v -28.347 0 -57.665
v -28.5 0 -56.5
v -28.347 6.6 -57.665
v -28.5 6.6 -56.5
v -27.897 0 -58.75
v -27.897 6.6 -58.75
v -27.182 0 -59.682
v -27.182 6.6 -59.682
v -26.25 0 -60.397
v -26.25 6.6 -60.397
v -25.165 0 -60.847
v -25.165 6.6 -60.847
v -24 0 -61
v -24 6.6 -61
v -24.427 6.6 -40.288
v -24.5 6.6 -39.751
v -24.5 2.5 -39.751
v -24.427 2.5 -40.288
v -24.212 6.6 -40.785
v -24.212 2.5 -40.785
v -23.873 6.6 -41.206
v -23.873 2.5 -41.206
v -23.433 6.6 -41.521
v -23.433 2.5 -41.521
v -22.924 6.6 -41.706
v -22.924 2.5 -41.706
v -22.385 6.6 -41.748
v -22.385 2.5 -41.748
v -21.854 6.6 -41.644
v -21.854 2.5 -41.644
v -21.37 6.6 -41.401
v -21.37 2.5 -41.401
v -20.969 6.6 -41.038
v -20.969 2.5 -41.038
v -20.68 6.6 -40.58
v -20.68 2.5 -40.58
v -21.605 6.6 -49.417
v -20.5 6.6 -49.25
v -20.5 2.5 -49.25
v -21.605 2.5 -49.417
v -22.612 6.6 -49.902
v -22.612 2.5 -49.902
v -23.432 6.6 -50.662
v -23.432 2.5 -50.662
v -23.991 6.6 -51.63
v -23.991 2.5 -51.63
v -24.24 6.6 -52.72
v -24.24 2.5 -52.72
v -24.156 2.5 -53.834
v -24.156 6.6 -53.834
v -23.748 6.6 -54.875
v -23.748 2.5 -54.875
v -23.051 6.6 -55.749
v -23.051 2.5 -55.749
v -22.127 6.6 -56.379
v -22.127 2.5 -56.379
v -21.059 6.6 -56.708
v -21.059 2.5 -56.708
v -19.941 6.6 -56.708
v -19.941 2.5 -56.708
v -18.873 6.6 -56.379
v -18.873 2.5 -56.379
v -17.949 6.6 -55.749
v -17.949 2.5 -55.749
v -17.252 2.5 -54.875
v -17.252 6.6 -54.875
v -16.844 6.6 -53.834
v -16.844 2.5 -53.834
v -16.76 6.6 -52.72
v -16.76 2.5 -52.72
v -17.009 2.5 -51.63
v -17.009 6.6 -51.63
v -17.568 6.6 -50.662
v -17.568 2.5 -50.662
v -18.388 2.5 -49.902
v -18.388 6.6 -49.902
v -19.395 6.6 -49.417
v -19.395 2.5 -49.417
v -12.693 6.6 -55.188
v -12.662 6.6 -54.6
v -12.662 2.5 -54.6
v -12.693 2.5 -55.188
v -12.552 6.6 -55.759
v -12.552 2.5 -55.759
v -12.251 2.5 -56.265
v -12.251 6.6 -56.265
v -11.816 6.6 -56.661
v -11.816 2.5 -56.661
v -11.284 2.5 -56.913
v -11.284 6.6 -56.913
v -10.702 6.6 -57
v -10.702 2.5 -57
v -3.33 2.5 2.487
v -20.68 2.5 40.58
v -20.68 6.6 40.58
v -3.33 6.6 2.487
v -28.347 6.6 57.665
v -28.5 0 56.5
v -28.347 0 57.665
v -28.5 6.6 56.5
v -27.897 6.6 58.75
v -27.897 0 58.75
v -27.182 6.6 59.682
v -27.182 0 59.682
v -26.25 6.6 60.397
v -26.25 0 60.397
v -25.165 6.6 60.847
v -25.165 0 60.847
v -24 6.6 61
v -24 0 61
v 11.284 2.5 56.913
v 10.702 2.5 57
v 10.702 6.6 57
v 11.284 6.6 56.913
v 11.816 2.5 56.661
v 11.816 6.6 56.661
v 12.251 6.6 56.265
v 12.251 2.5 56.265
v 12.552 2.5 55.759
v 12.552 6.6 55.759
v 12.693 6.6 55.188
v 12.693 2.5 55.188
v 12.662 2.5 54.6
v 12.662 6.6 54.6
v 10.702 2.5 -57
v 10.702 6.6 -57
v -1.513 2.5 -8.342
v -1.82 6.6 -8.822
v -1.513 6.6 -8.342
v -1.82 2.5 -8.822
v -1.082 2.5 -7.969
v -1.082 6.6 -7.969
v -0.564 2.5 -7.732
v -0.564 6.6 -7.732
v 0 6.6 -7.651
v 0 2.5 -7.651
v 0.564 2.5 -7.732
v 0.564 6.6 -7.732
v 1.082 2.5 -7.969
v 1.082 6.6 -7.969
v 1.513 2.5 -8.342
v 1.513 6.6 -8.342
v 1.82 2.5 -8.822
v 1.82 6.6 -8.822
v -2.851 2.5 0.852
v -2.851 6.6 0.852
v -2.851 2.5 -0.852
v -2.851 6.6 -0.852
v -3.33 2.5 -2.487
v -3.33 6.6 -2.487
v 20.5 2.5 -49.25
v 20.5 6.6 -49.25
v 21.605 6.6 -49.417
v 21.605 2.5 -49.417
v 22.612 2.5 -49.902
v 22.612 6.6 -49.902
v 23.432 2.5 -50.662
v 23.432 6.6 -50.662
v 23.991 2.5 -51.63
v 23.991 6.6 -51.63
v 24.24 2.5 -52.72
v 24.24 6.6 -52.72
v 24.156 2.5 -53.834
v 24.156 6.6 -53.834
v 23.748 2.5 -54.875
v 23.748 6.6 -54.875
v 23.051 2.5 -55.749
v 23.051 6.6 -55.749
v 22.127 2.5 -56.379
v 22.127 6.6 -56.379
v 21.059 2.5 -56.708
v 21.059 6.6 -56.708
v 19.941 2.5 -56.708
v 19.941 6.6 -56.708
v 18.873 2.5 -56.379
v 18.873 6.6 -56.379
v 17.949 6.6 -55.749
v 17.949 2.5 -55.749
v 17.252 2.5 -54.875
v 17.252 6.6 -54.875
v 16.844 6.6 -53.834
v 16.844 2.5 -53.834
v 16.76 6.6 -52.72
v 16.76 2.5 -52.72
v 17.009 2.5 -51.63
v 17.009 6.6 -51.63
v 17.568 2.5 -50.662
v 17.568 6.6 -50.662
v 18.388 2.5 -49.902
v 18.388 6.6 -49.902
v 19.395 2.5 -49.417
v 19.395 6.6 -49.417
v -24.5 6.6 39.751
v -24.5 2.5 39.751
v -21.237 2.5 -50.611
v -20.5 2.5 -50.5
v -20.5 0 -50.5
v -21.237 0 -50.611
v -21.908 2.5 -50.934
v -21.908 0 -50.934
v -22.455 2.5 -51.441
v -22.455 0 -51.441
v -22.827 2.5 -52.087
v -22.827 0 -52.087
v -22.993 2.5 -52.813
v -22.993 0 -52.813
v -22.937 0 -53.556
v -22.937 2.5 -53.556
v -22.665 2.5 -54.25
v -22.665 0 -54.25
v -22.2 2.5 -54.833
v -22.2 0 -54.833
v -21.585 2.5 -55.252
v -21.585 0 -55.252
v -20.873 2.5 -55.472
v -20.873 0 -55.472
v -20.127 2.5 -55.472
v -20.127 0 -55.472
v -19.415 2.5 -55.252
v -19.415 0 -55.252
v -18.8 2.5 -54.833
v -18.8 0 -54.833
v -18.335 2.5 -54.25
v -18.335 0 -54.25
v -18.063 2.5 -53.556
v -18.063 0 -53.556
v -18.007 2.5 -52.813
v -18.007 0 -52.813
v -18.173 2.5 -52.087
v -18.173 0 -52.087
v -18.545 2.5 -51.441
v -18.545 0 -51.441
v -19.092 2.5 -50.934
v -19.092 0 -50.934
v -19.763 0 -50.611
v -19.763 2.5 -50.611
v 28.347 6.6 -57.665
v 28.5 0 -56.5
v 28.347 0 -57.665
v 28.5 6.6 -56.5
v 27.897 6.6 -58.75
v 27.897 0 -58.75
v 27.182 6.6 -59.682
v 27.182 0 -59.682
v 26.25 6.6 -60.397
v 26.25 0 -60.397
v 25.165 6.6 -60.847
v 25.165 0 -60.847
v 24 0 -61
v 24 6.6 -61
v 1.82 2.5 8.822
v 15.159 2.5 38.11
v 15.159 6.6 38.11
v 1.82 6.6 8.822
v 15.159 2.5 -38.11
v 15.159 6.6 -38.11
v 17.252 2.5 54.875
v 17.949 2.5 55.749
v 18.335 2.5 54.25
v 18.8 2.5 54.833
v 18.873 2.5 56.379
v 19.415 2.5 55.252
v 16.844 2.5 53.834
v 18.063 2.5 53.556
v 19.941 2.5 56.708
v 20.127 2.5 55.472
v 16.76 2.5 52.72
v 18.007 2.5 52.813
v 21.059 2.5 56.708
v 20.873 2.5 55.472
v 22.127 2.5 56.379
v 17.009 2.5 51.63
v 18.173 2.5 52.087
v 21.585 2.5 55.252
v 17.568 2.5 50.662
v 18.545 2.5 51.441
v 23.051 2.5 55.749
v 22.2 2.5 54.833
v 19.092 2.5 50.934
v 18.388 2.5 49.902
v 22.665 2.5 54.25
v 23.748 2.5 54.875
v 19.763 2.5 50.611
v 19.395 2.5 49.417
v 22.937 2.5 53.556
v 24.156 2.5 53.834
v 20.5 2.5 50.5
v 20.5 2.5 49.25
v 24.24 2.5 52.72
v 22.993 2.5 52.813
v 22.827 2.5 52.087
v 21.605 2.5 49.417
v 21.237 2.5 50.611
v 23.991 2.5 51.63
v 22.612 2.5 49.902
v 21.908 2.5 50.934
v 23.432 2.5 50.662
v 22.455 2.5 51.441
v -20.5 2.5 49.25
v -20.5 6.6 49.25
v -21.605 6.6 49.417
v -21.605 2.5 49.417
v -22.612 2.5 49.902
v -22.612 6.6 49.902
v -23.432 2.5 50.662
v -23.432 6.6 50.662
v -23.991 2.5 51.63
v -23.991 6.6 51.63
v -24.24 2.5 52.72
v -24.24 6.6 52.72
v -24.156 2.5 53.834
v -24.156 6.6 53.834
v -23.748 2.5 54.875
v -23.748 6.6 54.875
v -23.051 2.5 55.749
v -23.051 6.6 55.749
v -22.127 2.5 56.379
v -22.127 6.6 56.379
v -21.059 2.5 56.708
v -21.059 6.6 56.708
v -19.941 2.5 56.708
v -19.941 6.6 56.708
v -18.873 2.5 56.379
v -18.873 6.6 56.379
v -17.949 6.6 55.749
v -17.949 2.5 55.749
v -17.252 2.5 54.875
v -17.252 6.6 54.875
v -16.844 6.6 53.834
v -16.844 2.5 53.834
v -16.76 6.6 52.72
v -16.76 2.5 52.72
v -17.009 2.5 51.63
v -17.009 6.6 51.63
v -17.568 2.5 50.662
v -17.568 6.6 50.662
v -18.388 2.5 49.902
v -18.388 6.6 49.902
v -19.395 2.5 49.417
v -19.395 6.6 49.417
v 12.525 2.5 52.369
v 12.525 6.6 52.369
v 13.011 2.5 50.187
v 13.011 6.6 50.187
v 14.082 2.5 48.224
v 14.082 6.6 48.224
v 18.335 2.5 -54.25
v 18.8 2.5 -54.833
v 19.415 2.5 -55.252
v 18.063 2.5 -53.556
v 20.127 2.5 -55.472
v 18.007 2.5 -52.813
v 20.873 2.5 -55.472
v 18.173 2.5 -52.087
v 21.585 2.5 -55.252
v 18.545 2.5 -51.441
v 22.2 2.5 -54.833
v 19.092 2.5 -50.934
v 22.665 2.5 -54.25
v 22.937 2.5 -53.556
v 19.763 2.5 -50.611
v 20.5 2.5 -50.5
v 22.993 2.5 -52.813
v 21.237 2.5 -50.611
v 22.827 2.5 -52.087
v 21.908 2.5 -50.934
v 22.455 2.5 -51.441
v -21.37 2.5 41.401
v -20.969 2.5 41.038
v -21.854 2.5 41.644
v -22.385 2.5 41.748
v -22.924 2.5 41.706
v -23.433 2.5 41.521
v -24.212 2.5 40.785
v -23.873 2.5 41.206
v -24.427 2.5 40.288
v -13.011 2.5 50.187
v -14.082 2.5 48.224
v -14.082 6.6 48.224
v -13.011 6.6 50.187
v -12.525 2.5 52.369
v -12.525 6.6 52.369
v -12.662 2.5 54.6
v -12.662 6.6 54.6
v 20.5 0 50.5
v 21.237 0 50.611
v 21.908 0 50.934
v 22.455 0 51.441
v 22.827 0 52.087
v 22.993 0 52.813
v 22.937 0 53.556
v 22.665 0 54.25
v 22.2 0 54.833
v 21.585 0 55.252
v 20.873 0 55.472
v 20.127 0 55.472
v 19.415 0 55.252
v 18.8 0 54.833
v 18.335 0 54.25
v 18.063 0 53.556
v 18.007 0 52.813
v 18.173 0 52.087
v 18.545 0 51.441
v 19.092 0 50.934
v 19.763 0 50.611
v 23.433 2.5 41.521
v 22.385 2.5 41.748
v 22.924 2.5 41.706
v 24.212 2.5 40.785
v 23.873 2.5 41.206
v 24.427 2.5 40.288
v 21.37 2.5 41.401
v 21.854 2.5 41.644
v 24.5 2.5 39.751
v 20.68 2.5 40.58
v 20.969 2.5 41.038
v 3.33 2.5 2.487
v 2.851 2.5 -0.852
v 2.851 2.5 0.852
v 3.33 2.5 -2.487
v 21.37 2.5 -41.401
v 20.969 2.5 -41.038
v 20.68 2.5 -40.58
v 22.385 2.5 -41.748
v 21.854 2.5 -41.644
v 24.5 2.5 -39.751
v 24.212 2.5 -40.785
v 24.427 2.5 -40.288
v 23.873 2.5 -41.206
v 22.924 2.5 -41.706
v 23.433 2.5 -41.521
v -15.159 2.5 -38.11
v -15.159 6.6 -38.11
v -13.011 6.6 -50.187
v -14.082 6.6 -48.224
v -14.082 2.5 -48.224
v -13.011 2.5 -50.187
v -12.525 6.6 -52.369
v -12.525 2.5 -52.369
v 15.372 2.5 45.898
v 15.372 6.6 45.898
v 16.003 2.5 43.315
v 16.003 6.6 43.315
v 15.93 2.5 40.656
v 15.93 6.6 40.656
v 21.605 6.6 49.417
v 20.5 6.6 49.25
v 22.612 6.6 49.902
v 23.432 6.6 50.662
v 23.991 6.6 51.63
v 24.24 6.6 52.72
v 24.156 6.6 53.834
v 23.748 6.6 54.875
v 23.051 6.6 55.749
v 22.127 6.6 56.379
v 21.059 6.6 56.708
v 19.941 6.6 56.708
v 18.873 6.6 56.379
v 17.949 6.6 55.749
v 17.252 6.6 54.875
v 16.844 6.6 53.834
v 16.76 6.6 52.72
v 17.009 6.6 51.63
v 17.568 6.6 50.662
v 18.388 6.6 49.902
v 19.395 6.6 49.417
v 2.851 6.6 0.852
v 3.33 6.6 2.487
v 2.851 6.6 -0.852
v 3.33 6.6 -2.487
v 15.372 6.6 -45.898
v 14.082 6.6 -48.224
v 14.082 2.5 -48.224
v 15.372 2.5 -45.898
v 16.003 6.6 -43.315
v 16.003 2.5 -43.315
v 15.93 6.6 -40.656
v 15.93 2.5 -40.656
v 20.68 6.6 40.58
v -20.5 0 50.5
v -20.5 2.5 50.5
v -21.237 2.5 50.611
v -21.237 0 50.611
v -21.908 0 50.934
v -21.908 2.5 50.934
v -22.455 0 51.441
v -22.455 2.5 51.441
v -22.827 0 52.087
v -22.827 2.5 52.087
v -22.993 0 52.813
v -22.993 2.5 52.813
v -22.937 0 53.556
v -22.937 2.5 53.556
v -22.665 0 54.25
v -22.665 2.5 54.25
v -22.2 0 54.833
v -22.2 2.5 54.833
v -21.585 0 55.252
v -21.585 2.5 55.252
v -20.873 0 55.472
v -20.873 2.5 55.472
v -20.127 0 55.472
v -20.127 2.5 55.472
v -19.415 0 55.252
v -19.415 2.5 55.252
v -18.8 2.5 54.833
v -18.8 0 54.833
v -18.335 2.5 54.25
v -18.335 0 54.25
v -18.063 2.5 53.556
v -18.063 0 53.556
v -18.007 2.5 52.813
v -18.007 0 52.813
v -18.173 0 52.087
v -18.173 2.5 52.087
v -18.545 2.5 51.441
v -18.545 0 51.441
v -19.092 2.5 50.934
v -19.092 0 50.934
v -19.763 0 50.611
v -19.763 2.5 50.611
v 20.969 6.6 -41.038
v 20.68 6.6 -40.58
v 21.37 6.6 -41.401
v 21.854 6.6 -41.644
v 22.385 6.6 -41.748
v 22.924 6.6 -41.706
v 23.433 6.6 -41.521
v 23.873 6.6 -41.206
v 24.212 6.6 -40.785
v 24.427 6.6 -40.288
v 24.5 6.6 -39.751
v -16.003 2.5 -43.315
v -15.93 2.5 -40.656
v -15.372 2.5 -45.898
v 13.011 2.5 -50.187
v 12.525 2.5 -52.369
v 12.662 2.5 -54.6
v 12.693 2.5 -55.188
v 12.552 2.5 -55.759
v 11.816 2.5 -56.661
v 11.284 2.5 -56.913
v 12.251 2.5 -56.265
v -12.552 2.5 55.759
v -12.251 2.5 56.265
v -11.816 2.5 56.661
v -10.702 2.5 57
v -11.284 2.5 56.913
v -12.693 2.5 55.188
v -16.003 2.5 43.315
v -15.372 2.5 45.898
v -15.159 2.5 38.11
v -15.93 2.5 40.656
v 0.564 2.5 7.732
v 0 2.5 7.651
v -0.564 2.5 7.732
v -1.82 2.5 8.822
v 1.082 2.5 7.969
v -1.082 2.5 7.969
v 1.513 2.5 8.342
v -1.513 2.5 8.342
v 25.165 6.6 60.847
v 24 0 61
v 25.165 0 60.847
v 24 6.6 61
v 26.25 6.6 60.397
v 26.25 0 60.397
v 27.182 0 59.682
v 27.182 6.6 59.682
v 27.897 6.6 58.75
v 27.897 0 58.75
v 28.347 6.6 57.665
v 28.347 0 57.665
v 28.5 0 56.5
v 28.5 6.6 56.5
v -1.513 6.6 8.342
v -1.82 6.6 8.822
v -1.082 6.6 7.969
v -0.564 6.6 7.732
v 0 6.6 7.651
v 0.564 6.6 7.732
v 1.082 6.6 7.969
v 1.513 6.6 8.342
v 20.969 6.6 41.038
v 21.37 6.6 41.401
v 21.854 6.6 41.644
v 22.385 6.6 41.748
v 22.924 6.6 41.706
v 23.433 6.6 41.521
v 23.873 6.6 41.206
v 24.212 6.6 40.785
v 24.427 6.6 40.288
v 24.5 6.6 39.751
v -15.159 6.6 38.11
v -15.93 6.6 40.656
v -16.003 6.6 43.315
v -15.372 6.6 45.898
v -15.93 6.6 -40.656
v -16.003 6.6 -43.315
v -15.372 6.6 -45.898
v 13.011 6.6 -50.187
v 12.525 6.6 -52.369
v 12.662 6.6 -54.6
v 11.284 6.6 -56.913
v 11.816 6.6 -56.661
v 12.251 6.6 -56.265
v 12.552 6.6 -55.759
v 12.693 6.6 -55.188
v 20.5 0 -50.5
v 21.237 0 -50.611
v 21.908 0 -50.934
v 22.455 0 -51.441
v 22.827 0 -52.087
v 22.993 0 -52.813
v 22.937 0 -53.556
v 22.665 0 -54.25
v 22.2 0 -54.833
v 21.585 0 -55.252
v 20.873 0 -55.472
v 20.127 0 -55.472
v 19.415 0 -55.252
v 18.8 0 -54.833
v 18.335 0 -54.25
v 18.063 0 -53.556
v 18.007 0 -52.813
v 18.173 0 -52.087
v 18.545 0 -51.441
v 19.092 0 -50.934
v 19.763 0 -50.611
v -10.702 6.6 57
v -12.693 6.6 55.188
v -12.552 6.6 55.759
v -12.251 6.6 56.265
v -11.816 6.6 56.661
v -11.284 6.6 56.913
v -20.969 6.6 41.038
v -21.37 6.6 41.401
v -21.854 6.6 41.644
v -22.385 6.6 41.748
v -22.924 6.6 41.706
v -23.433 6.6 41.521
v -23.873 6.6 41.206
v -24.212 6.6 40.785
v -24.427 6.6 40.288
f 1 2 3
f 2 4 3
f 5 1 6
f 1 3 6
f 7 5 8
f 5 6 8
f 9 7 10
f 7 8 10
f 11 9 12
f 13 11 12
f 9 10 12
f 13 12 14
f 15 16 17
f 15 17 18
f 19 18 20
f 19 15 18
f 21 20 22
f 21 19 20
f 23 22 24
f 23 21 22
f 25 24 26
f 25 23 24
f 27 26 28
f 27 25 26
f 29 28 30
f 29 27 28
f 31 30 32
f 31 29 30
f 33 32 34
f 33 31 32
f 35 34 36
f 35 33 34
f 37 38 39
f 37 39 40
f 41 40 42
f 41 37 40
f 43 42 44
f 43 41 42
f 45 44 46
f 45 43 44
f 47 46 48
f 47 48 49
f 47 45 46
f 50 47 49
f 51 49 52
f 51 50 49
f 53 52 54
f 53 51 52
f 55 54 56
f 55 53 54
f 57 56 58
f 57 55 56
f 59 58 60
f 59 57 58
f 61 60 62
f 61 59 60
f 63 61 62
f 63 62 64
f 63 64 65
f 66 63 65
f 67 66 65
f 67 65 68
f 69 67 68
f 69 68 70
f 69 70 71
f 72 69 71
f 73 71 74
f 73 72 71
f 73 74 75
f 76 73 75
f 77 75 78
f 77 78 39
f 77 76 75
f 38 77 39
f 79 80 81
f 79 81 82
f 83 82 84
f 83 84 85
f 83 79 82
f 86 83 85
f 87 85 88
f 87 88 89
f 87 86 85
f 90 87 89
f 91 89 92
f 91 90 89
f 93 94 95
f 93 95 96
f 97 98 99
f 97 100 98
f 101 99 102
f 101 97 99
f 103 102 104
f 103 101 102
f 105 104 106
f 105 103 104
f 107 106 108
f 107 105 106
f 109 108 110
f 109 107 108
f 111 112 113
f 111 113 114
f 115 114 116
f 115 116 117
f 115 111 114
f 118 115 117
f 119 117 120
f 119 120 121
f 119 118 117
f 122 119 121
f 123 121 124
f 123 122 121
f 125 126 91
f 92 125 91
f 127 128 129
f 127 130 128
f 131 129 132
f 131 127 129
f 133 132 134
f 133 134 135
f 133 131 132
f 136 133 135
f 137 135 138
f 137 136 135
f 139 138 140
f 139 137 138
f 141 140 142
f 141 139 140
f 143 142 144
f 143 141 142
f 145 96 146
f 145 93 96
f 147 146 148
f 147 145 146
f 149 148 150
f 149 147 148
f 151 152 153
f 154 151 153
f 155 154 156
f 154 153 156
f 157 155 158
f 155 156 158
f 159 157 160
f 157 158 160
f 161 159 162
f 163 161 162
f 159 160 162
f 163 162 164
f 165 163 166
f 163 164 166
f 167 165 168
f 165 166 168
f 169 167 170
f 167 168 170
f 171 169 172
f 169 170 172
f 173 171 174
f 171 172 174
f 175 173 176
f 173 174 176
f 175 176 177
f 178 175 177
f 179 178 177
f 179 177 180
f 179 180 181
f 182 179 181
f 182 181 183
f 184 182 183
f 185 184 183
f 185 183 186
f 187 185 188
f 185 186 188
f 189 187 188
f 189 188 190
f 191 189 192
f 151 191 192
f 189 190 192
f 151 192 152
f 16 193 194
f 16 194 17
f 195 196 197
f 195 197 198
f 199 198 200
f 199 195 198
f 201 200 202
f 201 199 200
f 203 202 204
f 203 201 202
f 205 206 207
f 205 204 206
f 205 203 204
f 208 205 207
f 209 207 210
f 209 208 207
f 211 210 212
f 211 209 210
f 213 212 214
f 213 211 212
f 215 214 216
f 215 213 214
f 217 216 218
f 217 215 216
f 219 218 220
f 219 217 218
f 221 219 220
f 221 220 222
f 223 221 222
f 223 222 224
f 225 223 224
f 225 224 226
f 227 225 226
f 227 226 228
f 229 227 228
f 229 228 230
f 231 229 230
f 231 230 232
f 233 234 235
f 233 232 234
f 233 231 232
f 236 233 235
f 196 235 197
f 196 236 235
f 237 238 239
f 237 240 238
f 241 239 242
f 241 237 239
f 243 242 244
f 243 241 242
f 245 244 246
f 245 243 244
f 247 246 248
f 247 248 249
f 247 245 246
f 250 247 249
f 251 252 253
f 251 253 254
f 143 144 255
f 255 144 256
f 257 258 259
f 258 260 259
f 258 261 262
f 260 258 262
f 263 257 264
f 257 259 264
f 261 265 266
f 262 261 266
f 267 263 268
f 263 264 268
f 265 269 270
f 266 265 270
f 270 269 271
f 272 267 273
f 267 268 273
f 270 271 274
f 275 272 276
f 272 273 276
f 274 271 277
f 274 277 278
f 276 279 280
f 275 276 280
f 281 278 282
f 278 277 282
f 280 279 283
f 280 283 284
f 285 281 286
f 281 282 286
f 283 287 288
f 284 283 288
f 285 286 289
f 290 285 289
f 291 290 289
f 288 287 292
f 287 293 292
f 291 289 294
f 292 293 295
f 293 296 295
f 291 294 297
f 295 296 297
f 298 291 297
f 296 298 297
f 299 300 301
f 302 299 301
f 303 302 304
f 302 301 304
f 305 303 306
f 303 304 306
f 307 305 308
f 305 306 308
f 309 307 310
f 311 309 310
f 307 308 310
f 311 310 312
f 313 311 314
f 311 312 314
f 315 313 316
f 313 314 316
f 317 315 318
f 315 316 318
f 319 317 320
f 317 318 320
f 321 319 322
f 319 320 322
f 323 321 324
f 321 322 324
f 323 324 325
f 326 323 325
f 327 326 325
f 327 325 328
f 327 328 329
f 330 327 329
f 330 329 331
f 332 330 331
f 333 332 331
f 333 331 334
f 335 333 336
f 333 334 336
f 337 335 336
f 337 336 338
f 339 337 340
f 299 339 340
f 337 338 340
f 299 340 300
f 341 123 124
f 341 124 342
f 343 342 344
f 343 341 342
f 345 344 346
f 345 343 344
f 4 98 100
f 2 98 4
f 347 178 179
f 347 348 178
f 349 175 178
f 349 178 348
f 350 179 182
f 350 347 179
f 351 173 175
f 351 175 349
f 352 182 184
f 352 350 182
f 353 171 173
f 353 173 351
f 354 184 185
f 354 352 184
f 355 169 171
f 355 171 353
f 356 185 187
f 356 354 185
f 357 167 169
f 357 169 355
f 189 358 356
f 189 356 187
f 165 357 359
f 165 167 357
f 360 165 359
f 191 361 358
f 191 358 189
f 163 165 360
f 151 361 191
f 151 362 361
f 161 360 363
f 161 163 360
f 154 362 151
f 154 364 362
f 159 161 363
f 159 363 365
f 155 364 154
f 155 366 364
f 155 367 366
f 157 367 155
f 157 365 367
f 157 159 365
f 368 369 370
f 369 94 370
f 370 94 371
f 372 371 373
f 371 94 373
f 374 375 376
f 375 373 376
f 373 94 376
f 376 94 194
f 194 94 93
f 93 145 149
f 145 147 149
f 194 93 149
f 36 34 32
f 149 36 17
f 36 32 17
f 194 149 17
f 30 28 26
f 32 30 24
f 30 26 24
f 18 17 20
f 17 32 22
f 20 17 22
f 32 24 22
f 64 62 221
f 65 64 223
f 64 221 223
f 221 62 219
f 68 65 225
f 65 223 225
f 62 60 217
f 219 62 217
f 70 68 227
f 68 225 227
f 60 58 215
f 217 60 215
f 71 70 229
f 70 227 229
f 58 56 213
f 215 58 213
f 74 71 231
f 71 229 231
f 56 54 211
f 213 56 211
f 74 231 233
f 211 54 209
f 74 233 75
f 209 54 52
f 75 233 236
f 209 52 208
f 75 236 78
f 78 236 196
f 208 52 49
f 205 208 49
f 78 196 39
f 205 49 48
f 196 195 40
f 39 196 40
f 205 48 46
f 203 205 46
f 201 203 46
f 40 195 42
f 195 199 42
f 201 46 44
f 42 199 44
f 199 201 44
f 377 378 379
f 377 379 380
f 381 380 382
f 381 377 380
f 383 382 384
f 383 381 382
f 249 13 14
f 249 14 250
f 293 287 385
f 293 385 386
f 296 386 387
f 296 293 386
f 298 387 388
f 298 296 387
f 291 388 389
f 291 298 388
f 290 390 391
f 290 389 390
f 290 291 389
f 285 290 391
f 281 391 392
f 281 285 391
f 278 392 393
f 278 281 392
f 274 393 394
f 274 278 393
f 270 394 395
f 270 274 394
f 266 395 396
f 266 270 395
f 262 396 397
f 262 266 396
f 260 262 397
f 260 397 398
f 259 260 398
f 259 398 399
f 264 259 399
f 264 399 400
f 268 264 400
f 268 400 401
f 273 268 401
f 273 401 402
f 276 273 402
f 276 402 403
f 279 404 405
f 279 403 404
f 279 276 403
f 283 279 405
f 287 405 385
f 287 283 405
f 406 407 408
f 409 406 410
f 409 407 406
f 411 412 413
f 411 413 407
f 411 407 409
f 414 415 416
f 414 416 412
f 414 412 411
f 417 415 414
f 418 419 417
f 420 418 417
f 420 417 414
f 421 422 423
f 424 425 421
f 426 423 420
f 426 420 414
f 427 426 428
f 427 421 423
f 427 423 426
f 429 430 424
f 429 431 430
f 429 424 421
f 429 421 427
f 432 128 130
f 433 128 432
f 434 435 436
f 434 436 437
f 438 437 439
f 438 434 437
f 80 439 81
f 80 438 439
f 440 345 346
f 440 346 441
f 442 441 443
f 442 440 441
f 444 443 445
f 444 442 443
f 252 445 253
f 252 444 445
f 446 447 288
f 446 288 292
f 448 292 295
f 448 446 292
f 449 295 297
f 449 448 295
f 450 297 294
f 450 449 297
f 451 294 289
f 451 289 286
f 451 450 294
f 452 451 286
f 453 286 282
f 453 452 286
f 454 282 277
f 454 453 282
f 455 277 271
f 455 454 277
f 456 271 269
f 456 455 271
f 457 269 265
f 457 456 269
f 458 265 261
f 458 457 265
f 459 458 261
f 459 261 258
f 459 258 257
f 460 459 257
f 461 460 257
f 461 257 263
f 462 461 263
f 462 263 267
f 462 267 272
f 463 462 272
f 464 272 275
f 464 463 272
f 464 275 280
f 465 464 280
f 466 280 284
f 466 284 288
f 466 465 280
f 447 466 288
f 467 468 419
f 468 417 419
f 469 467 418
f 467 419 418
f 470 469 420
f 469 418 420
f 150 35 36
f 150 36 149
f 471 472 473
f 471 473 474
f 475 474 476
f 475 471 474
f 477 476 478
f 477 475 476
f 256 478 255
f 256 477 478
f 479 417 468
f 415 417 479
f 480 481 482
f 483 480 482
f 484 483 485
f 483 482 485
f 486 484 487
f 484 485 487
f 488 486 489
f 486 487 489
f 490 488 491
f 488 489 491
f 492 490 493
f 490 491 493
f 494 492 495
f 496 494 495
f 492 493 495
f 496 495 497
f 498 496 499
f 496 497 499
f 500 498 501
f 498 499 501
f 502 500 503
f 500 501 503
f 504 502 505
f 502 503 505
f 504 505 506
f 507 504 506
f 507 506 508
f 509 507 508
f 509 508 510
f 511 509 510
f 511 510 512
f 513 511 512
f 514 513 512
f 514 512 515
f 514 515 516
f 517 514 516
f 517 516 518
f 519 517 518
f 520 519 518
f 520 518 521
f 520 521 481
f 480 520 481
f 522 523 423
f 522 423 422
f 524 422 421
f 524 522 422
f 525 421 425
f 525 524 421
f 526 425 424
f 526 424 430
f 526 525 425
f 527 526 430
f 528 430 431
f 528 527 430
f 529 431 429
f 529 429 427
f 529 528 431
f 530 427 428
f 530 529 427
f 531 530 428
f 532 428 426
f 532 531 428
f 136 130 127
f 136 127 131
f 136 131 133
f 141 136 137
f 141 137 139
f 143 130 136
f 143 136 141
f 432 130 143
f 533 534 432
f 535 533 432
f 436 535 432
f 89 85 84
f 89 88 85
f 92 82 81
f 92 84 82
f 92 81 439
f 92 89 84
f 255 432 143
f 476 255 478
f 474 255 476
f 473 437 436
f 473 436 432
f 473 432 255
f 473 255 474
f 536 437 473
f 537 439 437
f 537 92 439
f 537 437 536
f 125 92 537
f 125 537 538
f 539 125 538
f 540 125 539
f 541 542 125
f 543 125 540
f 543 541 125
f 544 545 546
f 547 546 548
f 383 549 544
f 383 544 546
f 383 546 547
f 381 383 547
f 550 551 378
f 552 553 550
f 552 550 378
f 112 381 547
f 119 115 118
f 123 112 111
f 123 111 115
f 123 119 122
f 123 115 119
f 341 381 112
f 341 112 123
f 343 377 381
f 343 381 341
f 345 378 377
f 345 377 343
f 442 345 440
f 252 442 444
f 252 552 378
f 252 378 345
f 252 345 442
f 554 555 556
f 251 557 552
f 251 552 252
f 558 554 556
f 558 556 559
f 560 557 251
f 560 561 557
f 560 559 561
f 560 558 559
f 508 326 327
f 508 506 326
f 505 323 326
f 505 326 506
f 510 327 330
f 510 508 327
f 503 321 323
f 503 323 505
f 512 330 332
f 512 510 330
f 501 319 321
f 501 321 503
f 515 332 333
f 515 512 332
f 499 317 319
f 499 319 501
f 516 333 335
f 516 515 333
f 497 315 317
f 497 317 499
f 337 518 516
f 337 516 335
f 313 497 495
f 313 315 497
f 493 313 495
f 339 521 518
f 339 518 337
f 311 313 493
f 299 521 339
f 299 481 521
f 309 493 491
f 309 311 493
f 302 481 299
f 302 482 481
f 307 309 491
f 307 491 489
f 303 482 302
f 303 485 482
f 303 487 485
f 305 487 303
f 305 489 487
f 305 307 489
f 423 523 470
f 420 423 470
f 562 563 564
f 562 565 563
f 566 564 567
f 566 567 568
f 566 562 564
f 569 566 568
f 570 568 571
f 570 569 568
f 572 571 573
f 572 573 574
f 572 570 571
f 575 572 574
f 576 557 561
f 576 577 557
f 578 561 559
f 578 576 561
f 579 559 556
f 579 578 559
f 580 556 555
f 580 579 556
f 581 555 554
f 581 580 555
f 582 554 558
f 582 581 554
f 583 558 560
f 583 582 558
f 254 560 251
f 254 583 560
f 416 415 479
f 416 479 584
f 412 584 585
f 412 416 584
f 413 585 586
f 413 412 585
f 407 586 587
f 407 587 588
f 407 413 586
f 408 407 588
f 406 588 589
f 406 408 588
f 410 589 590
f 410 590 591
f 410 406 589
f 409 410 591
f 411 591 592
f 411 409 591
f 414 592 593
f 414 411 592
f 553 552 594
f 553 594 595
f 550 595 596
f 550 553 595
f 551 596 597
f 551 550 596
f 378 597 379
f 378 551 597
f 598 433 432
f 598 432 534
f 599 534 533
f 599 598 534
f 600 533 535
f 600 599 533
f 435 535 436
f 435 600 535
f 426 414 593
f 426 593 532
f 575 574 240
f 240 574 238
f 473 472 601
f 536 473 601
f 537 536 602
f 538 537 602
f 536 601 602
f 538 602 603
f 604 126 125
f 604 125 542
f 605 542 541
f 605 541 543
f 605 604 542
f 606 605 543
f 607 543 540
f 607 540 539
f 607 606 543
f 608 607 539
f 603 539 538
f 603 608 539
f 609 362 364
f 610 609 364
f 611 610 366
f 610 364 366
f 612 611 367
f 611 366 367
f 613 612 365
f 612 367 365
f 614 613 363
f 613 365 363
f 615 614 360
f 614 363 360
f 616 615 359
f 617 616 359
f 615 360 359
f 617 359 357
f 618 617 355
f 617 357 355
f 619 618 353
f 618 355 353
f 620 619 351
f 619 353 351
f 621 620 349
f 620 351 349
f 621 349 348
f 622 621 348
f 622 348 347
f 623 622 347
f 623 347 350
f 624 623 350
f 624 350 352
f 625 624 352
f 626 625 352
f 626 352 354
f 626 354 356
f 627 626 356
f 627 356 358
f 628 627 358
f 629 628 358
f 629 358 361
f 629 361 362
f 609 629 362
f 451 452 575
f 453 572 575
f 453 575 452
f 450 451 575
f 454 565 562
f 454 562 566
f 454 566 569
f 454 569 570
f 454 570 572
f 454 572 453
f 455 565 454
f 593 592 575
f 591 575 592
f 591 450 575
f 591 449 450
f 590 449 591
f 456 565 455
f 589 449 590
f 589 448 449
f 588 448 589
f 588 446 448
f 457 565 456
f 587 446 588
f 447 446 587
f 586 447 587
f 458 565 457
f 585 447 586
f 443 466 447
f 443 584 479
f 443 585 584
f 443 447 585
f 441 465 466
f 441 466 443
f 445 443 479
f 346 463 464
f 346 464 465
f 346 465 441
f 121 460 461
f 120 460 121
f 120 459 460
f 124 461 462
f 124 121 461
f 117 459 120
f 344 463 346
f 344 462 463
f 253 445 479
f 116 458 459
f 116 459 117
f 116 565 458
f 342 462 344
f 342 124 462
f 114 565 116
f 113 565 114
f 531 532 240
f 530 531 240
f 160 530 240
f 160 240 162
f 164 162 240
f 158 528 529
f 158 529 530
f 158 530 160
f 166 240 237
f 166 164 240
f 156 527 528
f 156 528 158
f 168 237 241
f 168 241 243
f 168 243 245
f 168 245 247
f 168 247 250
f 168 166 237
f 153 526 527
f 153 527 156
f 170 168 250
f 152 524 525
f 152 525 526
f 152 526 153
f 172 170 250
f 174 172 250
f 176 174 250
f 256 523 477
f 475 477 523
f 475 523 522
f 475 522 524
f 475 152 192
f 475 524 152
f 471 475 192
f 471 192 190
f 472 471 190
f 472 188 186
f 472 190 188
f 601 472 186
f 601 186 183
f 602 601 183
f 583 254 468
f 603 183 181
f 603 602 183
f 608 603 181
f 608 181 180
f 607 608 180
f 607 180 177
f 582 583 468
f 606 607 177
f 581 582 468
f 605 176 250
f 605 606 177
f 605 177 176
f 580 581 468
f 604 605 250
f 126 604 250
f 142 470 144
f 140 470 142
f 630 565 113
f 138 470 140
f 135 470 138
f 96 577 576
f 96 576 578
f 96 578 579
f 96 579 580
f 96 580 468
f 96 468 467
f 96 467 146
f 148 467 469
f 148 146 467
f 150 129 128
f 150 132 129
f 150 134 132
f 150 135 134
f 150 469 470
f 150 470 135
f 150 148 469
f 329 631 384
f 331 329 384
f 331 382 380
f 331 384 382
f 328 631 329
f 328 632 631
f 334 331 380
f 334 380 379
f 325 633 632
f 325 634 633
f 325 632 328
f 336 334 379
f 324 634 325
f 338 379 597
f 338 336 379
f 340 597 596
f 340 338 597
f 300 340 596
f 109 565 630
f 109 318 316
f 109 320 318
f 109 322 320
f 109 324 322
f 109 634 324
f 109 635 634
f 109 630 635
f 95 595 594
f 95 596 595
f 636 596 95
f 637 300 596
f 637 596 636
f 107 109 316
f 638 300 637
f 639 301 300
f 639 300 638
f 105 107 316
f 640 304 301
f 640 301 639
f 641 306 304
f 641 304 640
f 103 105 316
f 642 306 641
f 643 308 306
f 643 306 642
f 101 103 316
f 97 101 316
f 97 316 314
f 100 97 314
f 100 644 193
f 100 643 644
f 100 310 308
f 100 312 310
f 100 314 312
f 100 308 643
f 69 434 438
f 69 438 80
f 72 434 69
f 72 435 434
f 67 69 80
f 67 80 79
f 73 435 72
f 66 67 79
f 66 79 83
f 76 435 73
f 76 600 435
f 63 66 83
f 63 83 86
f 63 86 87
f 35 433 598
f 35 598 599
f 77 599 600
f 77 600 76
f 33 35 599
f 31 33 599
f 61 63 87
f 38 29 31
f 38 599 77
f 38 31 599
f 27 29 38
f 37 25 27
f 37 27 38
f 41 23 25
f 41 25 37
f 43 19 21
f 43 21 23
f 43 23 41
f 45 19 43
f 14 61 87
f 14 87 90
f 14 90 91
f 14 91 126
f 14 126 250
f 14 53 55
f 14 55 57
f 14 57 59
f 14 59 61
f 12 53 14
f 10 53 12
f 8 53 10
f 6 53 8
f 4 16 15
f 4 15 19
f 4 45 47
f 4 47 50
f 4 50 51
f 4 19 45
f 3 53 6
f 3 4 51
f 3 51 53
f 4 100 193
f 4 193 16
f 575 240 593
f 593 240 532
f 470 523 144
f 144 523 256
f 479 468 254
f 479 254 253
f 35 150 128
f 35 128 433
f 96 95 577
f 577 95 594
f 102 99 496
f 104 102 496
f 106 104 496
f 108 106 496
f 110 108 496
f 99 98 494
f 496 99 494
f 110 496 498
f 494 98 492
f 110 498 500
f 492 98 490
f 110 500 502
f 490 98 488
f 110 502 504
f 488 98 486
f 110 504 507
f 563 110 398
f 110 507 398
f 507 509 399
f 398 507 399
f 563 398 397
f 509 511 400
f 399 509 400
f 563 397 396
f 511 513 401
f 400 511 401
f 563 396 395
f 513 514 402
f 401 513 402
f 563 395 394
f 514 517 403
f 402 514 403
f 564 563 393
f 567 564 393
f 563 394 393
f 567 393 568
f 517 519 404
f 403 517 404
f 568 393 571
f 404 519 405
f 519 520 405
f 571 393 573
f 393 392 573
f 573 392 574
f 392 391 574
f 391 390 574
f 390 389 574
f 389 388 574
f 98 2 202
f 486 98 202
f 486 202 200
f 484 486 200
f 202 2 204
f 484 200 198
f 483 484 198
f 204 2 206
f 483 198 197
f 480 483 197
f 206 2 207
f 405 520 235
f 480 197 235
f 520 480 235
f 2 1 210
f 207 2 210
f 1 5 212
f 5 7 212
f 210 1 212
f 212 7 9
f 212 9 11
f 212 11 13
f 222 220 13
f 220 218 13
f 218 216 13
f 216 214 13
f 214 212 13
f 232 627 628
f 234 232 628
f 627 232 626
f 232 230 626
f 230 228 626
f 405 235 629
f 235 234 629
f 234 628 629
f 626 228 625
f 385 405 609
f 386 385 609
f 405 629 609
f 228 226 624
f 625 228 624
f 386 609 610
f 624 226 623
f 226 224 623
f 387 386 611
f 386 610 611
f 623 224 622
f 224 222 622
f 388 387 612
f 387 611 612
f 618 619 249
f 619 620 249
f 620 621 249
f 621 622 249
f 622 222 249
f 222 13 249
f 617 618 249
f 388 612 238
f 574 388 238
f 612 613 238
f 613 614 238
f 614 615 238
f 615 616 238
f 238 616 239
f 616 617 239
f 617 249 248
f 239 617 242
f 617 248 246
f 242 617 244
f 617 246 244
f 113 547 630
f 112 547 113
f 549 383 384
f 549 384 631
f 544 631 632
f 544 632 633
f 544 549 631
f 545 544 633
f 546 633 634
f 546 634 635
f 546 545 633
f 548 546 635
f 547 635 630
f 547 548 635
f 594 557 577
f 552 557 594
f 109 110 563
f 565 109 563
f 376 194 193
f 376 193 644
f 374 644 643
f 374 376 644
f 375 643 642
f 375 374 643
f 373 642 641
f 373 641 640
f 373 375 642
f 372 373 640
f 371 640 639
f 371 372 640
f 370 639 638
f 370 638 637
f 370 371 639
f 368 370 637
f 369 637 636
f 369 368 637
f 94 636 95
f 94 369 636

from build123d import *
from OCP.BRepFilletAPI import BRepFilletAPI_MakeFillet

# Parameters (mm, degrees)
SKETCH1_W               = 57
SKETCH1_H               = 122
BOSS_EXTRUDE1_DEPTH     = 6.6
FILLET1_R               = 4.5
SKETCH2_R               = 2.5
CUT_EXTRUDE1_DEPTH      = 68.652124874
SKETCH3_R               = 3.75
CUT_EXTRUDE2_DEPTH      = 4.1
MIRROR3_COPY_1_SKETCH_R = 2.5
MIRROR3_COPY_1_DEPTH    = 68.652124874
MIRROR3_COPY_2_SKETCH_R = 3.75
MIRROR3_COPY_2_DEPTH    = 4.1
CUT_EXTRUDE3_DEPTH      = 4.1
FILLET2_R               = 10
FILLET3_R               = 2
FILLET2_OF_MIRROR4_R    = 10
FILLET3_OF_MIRROR4_R    = 2
MIRROR5_START           = 2.5
MIRROR5_DEPTH           = 4.1
FILLET4_R1              = 2
FILLET4_R2              = 6


with BuildPart() as part:
    # Sketch1 → Boss-Extrude1 (new body)
    with BuildSketch(Plane(origin=(0, 0, 0), x_dir=(1, 0, 0), z_dir=(0, 1, 0))):
        Rectangle(SKETCH1_W, SKETCH1_H)
    extrude(amount=BOSS_EXTRUDE1_DEPTH)

    # Fillet1
    fillet1_edges = [part.edges().sort_by_distance(p)[0] for p in [
        (28.5, 3.3, 61),
        (-28.5, 3.3, 61),
        (-28.5, 3.3, -61),
        (28.5, 3.3, -61),
    ]]
    fillet(fillet1_edges, radius=FILLET1_R)

    # Sketch2 → Cut-Extrude1 (cut, through all)
    with BuildSketch(Plane(origin=(0, 6.6, 0), x_dir=(1, 0, 0), z_dir=(0, 1, 0))):
        with Locations(Location((20.5, 53, 0), (0, 0, 270))):
            Circle(SKETCH2_R)
    cut_extrude1 = extrude(amount=-CUT_EXTRUDE1_DEPTH, mode=Mode.SUBTRACT)

    # Sketch3 → Cut-Extrude2 (cut)
    with BuildSketch(Plane(origin=(0, 6.6, 0), x_dir=(1, 0, 0), z_dir=(0, 1, 0))):
        with Locations(Location((20.5, 53, 0), (0, 0, 270))):
            Circle(SKETCH3_R)
    cut_extrude2 = extrude(amount=-CUT_EXTRUDE2_DEPTH, mode=Mode.SUBTRACT)

    # Mirror1: Cut-Extrude1, Cut-Extrude2 across plane
    add(cut_extrude1.mirror(Plane(origin=(0, 0, 0), x_dir=(0, 0, 1), z_dir=(1, 0, 0))), mode=Mode.SUBTRACT)
    add(cut_extrude2.mirror(Plane(origin=(0, 0, 0), x_dir=(0, 0, 1), z_dir=(1, 0, 0))), mode=Mode.SUBTRACT)

    # Mirror3: Cut-Extrude1, Cut-Extrude2 across plane
    add(cut_extrude1.mirror(Plane.XY), mode=Mode.SUBTRACT)
    add(cut_extrude2.mirror(Plane.XY), mode=Mode.SUBTRACT)

    # Mirror3 copy 1 sketch → Mirror3 copy 1 (cut, through all)
    with BuildSketch(Plane(origin=(0, 6.6, 0), x_dir=(-1, 0, 0), z_dir=(0, 1, 0))):
        with Locations(Location((20.5, 53, 0), (0, 0, 270))):
            Circle(MIRROR3_COPY_1_SKETCH_R)
    extrude(amount=-MIRROR3_COPY_1_DEPTH, mode=Mode.SUBTRACT)

    # Mirror3 copy 2 sketch → Mirror3 copy 2 (cut)
    with BuildSketch(Plane(origin=(0, 6.6, 0), x_dir=(-1, 0, 0), z_dir=(0, 1, 0))):
        with Locations(Location((20.5, 53, 0), (0, 0, 270))):
            Circle(MIRROR3_COPY_2_SKETCH_R)
    extrude(amount=-MIRROR3_COPY_2_DEPTH, mode=Mode.SUBTRACT)

    # Sketch4 → Cut-Extrude3 (cut)
    with BuildSketch(Plane(origin=(0, 6.6, 0), x_dir=(1, 0, 0), z_dir=(0, 1, 0))):
        with BuildLine():
            Line((0, 57), (0, 4.825290504))
            Line((0, 4.825290504), (18.422458297, 45.274469567))
            ThreePointArc((18.422458297, 45.274469567), (13.107579799, 49.941875809), (13.57179677, 57))
            Line((13.57179677, 57), (0, 57))
        make_face()
        with BuildLine():
            Line((24.5, 0), (24.5, 46.07179677))
            ThreePointArc((24.5, 46.07179677), (23.697246566, 45.666677806), (22.854101194, 45.354203274))
            Line((22.854101194, 45.354203274), (2.197664208, 0))
            Line((2.197664208, 0), (24.5, 0))
        make_face()
    cut_extrude3 = extrude(amount=-CUT_EXTRUDE3_DEPTH, mode=Mode.SUBTRACT)

    # Fillet2
    # the kernel refuses this fillet: 10 mm, written as the material it adds along each edge
    with BuildSketch(Plane(origin=(22.854101194, 6.6, -45.354203274), x_dir=(0.9166652742214988, 0, -0.3996558207213108), z_dir=(0, -1, 0))) as fillet2_piece_1:
        with BuildLine():
            CenterArc((4.145887895, 9.719866853), FILLET2_R, 228.043415152, 28.362844717)
            Line((-2.539785162, 2.28335048), (-2.673498623, 2.134620152))
            Line((-2.673498623, 2.134620152), (-0.133713461, -0.148730327))
            Line((-0.133713461, -0.148730327), (0.022444109, -0.198736665))
            ThreePointArc((0.022444109, -0.198736665), (0.897764349, -0.149466597), (1.748521514, -0.194397337))
            Line((1.748521514, -0.194397337), (1.795528698, 0))
        make_face()
    extrude(amount=4.1)
    with BuildSketch(Plane(origin=(18.422458297, 6.6, -45.274469567), x_dir=(-0.41448281678671633, 0, 0.9100571380899934), z_dir=(0, -1, 0))) as fillet2_piece_2:
        with BuildLine():
            CenterArc((7.872374254, 10), FILLET2_R, 208.861826981, 61.138173019)
            Line((-0.885488916, 5.173009977), (-1.06064618, 5.076470177))
            ThreePointArc((-1.06064618, 5.076470177), (-0.203601176, 2.627440291), (-0.197294486, 0.032785449))
            Line((-0.197294486, 0.032785449), (0, -0.2))
            Line((0, -0.2), (7.872374254, -0.2))
            Line((7.872374254, -0.2), (7.872374254, 0))
        make_face()
    extrude(amount=4.1)

    # Fillet3
    # the kernel refuses this fillet: 2 mm, written as the material it adds along each edge
    with BuildSketch(Plane(origin=(13.57179677, 6.6, -57), x_dir=(-0.3545926272331019, 0, 0.9350208921259068), z_dir=(0, -1, 0))) as fillet3_piece_1:
        with BuildLine():
            CenterArc((2.887636012, 1.974096319), FILLET3_R, 159.231520484, 101.536959033)
            Line((1.017594228, 2.683281573), (0, 0))
            ThreePointArc((0, 0), (1.283393783, 0.103614726), (2.566787566, 0))
        make_face()
    extrude(amount=4.1)
    with BuildSketch(Plane(origin=(24.5, 6.6, -46.07179677), x_dir=(-0.5710655658719064, 0, 0.8209044520986588), z_dir=(0, -1, 0))) as fillet3_piece_2:
        with BuildLine():
            CenterArc((6.330546511, -1.967533641), FILLET3_R, 79.662186843, 155.513248783)
            Line((5.18841538, -3.609342545), (5.074202266, -3.773523436))
            Line((5.074202266, -3.773523436), (-0.114213113, -0.16418089))
            Line((-0.114213113, -0.16418089), (-0.061886493, 0.190184284))
            ThreePointArc((-0.061886493, 0.190184284), (4.924730005, 0.525207358), (6.725339822, 0.196753364))
            Line((6.725339822, 0.196753364), (6.689449521, 0))
        make_face()
    extrude(amount=4.1)

    # Mirror4: Cut-Extrude3 across plane
    add(cut_extrude3.mirror(Plane(origin=(0, 0, 0), x_dir=(0, 0, 1), z_dir=(1, 0, 0))), mode=Mode.SUBTRACT)

    # Fillet2 of Mirror4
    # the kernel refuses this fillet: 10 mm, written as the material it adds along each edge
    with BuildSketch(Plane(origin=(-22.854101194, 6.6, -45.354203274), x_dir=(0.4144828167867165, 0, 0.9100571380899934), z_dir=(0, -1, 0))) as fillet2_of_mirror4_piece_1:
        with BuildLine():
            CenterArc((3.415288872, 10), FILLET2_OF_MIRROR4_R, 241.637155283, 28.362844717)
            Line((-1.335247856, 1.200431784), (-1.43025859, 1.024440419))
            ThreePointArc((-1.43025859, 1.024440419), (-0.767552408, 0.489064812), (-0.149559435, -0.132785449))
            Line((-0.149559435, -0.132785449), (0, -0.2))
            Line((0, -0.2), (3.415288872, -0.2))
            Line((3.415288872, -0.2), (3.415288872, 0))
        make_face()
    extrude(amount=4.1)
    with BuildSketch(Plane(origin=(-18.422458297, 6.6, -45.274469567), x_dir=(0.8270785739825625, 0, -0.5620863211811608), z_dir=(0, -1, 0))) as fillet2_of_mirror4_piece_2:
        with BuildLine():
            CenterArc((8.528405442, 9.446723083), FILLET2_OF_MIRROR4_R, 189.713452681, 61.138173019)
            Line((-1.328233375, 7.759514966), (-1.525366151, 7.725770803))
            Line((-1.525366151, 7.725770803), (-0.197132776, -0.033744162))
            Line((-0.197132776, -0.033744162), (0.065603119, -0.188934462))
            ThreePointArc((0.065603119, -0.188934462), (2.624124751, 0.242621533), (5.182646384, -0.188934462))
            Line((5.182646384, -0.188934462), (5.248249503, 0))
        make_face()
    extrude(amount=4.1)

    # Fillet3 of Mirror4
    # the kernel refuses this fillet: 2 mm, written as the material it adds along each edge
    with BuildSketch(Plane(origin=(-13.57179677, 6.6, -57), x_dir=(0.35459262723310125, 0, 0.935020892125907), z_dir=(0, -1, 0))) as fillet3_of_mirror4_piece_1:
        with BuildLine():
            CenterArc((2.887636012, -1.974096319), FILLET3_OF_MIRROR4_R, 99.231520484, 101.536959033)
            Line((1.017594228, -2.683281573), (0, 0))
            ThreePointArc((0, 0), (1.283393783, -0.103614726), (2.566787566, 0))
        make_face()
    extrude(amount=4.1)
    with BuildSketch(Plane(origin=(-24.5, 6.6, -46.07179677), x_dir=(0.5710655658719064, 0, 0.8209044520986588), z_dir=(0, -1, 0))) as fillet3_of_mirror4_piece_2:
        with BuildLine():
            CenterArc((6.330546511, 1.967533641), FILLET3_OF_MIRROR4_R, 124.824564374, 155.513248783)
            Line((5.18841538, 3.609342545), (5.074202266, 3.773523436))
            Line((5.074202266, 3.773523436), (-0.114213113, 0.16418089))
            Line((-0.114213113, 0.16418089), (-0.061886493, -0.190184284))
            ThreePointArc((-0.061886493, -0.190184284), (4.924730005, -0.525207358), (6.725339822, -0.196753364))
            Line((6.725339822, -0.196753364), (6.689449521, 0))
        make_face()
    extrude(amount=4.1)

    # Mirror5: read off the stored shape, not the designer's step
    # Mirror5 outline → Mirror5 (cut)
    with BuildSketch(Plane(origin=(0, 0, 0), x_dir=(1, 0, 0), z_dir=(0, 1, 0)).offset(MIRROR5_START)):
        with BuildLine():
            Line((-20.679885724, -40.580397876), (-2.197664208, 0))
            Line((-2.197664208, 0), (-24.5, 0))
            Line((-24.5, 0), (-24.5, -39.751432242))
            ThreePointArc((-24.5, -39.751432242), (-22.924129372, -41.705943505), (-20.679885724, -40.580397876))
        make_face()
        with BuildLine():
            ThreePointArc((20.679885724, -40.580397876), (22.924129372, -41.705943505), (24.5, -39.751432242))
            Line((24.5, -39.751432242), (24.5, 0))
            Line((24.5, 0), (2.197664208, 0))
            Line((2.197664208, 0), (20.679885724, -40.580397876))
        make_face()
        with BuildLine():
            Line((15.159494442, -38.110159183), (0, -4.825290504))
            Line((0, -4.825290504), (-15.159494442, -38.110159183))
            ThreePointArc((-15.159494442, -38.110159183), (-16.002629649, -43.314562397), (-14.081743582, -48.224438823))
            ThreePointArc((-14.081743582, -48.224438823), (-12.69136541, -51.260682364), (-12.661632823, -54.6))
            ThreePointArc((-12.661632823, -54.6), (-12.251234367, -56.264911064), (-10.702041029, -57))
            Line((-10.702041029, -57), (10.702041029, -57))
            ThreePointArc((10.702041029, -57), (12.251234367, -56.264911064), (12.661632823, -54.6))
            ThreePointArc((12.661632823, -54.6), (12.69136541, -51.260682364), (14.081743582, -48.224438823))
            ThreePointArc((14.081743582, -48.224438823), (16.002629649, -43.314562397), (15.159494442, -38.110159183))
        make_face()
    extrude(amount=MIRROR5_DEPTH, mode=Mode.SUBTRACT)

    # Fillet4: one fillet with a radius per group of edges: ONE call of the kernel's fillet builder (fillet() takes one radius for all edges)
    fillet4_edges_1 = [part.edges().sort_by_distance(p)[0] for p in [
        (0, 4.55, -4.825290504),
        (0, 4.55, 4.825290504),
    ]]
    fillet4_edges_2 = [part.edges().sort_by_distance(p)[0] for p in [
        (-2.197664208, 4.55, 0),
        (2.197664208, 4.55, 0),
    ]]
    fillet4 = BRepFilletAPI_MakeFillet(part.part.solid().wrapped)
    for e in fillet4_edges_1:
        fillet4.Add(FILLET4_R1, e.wrapped)
    for e in fillet4_edges_2:
        fillet4.Add(FILLET4_R2, e.wrapped)
    add(Compound.cast(fillet4.Shape()), mode=Mode.REPLACE)


solid = part.part
